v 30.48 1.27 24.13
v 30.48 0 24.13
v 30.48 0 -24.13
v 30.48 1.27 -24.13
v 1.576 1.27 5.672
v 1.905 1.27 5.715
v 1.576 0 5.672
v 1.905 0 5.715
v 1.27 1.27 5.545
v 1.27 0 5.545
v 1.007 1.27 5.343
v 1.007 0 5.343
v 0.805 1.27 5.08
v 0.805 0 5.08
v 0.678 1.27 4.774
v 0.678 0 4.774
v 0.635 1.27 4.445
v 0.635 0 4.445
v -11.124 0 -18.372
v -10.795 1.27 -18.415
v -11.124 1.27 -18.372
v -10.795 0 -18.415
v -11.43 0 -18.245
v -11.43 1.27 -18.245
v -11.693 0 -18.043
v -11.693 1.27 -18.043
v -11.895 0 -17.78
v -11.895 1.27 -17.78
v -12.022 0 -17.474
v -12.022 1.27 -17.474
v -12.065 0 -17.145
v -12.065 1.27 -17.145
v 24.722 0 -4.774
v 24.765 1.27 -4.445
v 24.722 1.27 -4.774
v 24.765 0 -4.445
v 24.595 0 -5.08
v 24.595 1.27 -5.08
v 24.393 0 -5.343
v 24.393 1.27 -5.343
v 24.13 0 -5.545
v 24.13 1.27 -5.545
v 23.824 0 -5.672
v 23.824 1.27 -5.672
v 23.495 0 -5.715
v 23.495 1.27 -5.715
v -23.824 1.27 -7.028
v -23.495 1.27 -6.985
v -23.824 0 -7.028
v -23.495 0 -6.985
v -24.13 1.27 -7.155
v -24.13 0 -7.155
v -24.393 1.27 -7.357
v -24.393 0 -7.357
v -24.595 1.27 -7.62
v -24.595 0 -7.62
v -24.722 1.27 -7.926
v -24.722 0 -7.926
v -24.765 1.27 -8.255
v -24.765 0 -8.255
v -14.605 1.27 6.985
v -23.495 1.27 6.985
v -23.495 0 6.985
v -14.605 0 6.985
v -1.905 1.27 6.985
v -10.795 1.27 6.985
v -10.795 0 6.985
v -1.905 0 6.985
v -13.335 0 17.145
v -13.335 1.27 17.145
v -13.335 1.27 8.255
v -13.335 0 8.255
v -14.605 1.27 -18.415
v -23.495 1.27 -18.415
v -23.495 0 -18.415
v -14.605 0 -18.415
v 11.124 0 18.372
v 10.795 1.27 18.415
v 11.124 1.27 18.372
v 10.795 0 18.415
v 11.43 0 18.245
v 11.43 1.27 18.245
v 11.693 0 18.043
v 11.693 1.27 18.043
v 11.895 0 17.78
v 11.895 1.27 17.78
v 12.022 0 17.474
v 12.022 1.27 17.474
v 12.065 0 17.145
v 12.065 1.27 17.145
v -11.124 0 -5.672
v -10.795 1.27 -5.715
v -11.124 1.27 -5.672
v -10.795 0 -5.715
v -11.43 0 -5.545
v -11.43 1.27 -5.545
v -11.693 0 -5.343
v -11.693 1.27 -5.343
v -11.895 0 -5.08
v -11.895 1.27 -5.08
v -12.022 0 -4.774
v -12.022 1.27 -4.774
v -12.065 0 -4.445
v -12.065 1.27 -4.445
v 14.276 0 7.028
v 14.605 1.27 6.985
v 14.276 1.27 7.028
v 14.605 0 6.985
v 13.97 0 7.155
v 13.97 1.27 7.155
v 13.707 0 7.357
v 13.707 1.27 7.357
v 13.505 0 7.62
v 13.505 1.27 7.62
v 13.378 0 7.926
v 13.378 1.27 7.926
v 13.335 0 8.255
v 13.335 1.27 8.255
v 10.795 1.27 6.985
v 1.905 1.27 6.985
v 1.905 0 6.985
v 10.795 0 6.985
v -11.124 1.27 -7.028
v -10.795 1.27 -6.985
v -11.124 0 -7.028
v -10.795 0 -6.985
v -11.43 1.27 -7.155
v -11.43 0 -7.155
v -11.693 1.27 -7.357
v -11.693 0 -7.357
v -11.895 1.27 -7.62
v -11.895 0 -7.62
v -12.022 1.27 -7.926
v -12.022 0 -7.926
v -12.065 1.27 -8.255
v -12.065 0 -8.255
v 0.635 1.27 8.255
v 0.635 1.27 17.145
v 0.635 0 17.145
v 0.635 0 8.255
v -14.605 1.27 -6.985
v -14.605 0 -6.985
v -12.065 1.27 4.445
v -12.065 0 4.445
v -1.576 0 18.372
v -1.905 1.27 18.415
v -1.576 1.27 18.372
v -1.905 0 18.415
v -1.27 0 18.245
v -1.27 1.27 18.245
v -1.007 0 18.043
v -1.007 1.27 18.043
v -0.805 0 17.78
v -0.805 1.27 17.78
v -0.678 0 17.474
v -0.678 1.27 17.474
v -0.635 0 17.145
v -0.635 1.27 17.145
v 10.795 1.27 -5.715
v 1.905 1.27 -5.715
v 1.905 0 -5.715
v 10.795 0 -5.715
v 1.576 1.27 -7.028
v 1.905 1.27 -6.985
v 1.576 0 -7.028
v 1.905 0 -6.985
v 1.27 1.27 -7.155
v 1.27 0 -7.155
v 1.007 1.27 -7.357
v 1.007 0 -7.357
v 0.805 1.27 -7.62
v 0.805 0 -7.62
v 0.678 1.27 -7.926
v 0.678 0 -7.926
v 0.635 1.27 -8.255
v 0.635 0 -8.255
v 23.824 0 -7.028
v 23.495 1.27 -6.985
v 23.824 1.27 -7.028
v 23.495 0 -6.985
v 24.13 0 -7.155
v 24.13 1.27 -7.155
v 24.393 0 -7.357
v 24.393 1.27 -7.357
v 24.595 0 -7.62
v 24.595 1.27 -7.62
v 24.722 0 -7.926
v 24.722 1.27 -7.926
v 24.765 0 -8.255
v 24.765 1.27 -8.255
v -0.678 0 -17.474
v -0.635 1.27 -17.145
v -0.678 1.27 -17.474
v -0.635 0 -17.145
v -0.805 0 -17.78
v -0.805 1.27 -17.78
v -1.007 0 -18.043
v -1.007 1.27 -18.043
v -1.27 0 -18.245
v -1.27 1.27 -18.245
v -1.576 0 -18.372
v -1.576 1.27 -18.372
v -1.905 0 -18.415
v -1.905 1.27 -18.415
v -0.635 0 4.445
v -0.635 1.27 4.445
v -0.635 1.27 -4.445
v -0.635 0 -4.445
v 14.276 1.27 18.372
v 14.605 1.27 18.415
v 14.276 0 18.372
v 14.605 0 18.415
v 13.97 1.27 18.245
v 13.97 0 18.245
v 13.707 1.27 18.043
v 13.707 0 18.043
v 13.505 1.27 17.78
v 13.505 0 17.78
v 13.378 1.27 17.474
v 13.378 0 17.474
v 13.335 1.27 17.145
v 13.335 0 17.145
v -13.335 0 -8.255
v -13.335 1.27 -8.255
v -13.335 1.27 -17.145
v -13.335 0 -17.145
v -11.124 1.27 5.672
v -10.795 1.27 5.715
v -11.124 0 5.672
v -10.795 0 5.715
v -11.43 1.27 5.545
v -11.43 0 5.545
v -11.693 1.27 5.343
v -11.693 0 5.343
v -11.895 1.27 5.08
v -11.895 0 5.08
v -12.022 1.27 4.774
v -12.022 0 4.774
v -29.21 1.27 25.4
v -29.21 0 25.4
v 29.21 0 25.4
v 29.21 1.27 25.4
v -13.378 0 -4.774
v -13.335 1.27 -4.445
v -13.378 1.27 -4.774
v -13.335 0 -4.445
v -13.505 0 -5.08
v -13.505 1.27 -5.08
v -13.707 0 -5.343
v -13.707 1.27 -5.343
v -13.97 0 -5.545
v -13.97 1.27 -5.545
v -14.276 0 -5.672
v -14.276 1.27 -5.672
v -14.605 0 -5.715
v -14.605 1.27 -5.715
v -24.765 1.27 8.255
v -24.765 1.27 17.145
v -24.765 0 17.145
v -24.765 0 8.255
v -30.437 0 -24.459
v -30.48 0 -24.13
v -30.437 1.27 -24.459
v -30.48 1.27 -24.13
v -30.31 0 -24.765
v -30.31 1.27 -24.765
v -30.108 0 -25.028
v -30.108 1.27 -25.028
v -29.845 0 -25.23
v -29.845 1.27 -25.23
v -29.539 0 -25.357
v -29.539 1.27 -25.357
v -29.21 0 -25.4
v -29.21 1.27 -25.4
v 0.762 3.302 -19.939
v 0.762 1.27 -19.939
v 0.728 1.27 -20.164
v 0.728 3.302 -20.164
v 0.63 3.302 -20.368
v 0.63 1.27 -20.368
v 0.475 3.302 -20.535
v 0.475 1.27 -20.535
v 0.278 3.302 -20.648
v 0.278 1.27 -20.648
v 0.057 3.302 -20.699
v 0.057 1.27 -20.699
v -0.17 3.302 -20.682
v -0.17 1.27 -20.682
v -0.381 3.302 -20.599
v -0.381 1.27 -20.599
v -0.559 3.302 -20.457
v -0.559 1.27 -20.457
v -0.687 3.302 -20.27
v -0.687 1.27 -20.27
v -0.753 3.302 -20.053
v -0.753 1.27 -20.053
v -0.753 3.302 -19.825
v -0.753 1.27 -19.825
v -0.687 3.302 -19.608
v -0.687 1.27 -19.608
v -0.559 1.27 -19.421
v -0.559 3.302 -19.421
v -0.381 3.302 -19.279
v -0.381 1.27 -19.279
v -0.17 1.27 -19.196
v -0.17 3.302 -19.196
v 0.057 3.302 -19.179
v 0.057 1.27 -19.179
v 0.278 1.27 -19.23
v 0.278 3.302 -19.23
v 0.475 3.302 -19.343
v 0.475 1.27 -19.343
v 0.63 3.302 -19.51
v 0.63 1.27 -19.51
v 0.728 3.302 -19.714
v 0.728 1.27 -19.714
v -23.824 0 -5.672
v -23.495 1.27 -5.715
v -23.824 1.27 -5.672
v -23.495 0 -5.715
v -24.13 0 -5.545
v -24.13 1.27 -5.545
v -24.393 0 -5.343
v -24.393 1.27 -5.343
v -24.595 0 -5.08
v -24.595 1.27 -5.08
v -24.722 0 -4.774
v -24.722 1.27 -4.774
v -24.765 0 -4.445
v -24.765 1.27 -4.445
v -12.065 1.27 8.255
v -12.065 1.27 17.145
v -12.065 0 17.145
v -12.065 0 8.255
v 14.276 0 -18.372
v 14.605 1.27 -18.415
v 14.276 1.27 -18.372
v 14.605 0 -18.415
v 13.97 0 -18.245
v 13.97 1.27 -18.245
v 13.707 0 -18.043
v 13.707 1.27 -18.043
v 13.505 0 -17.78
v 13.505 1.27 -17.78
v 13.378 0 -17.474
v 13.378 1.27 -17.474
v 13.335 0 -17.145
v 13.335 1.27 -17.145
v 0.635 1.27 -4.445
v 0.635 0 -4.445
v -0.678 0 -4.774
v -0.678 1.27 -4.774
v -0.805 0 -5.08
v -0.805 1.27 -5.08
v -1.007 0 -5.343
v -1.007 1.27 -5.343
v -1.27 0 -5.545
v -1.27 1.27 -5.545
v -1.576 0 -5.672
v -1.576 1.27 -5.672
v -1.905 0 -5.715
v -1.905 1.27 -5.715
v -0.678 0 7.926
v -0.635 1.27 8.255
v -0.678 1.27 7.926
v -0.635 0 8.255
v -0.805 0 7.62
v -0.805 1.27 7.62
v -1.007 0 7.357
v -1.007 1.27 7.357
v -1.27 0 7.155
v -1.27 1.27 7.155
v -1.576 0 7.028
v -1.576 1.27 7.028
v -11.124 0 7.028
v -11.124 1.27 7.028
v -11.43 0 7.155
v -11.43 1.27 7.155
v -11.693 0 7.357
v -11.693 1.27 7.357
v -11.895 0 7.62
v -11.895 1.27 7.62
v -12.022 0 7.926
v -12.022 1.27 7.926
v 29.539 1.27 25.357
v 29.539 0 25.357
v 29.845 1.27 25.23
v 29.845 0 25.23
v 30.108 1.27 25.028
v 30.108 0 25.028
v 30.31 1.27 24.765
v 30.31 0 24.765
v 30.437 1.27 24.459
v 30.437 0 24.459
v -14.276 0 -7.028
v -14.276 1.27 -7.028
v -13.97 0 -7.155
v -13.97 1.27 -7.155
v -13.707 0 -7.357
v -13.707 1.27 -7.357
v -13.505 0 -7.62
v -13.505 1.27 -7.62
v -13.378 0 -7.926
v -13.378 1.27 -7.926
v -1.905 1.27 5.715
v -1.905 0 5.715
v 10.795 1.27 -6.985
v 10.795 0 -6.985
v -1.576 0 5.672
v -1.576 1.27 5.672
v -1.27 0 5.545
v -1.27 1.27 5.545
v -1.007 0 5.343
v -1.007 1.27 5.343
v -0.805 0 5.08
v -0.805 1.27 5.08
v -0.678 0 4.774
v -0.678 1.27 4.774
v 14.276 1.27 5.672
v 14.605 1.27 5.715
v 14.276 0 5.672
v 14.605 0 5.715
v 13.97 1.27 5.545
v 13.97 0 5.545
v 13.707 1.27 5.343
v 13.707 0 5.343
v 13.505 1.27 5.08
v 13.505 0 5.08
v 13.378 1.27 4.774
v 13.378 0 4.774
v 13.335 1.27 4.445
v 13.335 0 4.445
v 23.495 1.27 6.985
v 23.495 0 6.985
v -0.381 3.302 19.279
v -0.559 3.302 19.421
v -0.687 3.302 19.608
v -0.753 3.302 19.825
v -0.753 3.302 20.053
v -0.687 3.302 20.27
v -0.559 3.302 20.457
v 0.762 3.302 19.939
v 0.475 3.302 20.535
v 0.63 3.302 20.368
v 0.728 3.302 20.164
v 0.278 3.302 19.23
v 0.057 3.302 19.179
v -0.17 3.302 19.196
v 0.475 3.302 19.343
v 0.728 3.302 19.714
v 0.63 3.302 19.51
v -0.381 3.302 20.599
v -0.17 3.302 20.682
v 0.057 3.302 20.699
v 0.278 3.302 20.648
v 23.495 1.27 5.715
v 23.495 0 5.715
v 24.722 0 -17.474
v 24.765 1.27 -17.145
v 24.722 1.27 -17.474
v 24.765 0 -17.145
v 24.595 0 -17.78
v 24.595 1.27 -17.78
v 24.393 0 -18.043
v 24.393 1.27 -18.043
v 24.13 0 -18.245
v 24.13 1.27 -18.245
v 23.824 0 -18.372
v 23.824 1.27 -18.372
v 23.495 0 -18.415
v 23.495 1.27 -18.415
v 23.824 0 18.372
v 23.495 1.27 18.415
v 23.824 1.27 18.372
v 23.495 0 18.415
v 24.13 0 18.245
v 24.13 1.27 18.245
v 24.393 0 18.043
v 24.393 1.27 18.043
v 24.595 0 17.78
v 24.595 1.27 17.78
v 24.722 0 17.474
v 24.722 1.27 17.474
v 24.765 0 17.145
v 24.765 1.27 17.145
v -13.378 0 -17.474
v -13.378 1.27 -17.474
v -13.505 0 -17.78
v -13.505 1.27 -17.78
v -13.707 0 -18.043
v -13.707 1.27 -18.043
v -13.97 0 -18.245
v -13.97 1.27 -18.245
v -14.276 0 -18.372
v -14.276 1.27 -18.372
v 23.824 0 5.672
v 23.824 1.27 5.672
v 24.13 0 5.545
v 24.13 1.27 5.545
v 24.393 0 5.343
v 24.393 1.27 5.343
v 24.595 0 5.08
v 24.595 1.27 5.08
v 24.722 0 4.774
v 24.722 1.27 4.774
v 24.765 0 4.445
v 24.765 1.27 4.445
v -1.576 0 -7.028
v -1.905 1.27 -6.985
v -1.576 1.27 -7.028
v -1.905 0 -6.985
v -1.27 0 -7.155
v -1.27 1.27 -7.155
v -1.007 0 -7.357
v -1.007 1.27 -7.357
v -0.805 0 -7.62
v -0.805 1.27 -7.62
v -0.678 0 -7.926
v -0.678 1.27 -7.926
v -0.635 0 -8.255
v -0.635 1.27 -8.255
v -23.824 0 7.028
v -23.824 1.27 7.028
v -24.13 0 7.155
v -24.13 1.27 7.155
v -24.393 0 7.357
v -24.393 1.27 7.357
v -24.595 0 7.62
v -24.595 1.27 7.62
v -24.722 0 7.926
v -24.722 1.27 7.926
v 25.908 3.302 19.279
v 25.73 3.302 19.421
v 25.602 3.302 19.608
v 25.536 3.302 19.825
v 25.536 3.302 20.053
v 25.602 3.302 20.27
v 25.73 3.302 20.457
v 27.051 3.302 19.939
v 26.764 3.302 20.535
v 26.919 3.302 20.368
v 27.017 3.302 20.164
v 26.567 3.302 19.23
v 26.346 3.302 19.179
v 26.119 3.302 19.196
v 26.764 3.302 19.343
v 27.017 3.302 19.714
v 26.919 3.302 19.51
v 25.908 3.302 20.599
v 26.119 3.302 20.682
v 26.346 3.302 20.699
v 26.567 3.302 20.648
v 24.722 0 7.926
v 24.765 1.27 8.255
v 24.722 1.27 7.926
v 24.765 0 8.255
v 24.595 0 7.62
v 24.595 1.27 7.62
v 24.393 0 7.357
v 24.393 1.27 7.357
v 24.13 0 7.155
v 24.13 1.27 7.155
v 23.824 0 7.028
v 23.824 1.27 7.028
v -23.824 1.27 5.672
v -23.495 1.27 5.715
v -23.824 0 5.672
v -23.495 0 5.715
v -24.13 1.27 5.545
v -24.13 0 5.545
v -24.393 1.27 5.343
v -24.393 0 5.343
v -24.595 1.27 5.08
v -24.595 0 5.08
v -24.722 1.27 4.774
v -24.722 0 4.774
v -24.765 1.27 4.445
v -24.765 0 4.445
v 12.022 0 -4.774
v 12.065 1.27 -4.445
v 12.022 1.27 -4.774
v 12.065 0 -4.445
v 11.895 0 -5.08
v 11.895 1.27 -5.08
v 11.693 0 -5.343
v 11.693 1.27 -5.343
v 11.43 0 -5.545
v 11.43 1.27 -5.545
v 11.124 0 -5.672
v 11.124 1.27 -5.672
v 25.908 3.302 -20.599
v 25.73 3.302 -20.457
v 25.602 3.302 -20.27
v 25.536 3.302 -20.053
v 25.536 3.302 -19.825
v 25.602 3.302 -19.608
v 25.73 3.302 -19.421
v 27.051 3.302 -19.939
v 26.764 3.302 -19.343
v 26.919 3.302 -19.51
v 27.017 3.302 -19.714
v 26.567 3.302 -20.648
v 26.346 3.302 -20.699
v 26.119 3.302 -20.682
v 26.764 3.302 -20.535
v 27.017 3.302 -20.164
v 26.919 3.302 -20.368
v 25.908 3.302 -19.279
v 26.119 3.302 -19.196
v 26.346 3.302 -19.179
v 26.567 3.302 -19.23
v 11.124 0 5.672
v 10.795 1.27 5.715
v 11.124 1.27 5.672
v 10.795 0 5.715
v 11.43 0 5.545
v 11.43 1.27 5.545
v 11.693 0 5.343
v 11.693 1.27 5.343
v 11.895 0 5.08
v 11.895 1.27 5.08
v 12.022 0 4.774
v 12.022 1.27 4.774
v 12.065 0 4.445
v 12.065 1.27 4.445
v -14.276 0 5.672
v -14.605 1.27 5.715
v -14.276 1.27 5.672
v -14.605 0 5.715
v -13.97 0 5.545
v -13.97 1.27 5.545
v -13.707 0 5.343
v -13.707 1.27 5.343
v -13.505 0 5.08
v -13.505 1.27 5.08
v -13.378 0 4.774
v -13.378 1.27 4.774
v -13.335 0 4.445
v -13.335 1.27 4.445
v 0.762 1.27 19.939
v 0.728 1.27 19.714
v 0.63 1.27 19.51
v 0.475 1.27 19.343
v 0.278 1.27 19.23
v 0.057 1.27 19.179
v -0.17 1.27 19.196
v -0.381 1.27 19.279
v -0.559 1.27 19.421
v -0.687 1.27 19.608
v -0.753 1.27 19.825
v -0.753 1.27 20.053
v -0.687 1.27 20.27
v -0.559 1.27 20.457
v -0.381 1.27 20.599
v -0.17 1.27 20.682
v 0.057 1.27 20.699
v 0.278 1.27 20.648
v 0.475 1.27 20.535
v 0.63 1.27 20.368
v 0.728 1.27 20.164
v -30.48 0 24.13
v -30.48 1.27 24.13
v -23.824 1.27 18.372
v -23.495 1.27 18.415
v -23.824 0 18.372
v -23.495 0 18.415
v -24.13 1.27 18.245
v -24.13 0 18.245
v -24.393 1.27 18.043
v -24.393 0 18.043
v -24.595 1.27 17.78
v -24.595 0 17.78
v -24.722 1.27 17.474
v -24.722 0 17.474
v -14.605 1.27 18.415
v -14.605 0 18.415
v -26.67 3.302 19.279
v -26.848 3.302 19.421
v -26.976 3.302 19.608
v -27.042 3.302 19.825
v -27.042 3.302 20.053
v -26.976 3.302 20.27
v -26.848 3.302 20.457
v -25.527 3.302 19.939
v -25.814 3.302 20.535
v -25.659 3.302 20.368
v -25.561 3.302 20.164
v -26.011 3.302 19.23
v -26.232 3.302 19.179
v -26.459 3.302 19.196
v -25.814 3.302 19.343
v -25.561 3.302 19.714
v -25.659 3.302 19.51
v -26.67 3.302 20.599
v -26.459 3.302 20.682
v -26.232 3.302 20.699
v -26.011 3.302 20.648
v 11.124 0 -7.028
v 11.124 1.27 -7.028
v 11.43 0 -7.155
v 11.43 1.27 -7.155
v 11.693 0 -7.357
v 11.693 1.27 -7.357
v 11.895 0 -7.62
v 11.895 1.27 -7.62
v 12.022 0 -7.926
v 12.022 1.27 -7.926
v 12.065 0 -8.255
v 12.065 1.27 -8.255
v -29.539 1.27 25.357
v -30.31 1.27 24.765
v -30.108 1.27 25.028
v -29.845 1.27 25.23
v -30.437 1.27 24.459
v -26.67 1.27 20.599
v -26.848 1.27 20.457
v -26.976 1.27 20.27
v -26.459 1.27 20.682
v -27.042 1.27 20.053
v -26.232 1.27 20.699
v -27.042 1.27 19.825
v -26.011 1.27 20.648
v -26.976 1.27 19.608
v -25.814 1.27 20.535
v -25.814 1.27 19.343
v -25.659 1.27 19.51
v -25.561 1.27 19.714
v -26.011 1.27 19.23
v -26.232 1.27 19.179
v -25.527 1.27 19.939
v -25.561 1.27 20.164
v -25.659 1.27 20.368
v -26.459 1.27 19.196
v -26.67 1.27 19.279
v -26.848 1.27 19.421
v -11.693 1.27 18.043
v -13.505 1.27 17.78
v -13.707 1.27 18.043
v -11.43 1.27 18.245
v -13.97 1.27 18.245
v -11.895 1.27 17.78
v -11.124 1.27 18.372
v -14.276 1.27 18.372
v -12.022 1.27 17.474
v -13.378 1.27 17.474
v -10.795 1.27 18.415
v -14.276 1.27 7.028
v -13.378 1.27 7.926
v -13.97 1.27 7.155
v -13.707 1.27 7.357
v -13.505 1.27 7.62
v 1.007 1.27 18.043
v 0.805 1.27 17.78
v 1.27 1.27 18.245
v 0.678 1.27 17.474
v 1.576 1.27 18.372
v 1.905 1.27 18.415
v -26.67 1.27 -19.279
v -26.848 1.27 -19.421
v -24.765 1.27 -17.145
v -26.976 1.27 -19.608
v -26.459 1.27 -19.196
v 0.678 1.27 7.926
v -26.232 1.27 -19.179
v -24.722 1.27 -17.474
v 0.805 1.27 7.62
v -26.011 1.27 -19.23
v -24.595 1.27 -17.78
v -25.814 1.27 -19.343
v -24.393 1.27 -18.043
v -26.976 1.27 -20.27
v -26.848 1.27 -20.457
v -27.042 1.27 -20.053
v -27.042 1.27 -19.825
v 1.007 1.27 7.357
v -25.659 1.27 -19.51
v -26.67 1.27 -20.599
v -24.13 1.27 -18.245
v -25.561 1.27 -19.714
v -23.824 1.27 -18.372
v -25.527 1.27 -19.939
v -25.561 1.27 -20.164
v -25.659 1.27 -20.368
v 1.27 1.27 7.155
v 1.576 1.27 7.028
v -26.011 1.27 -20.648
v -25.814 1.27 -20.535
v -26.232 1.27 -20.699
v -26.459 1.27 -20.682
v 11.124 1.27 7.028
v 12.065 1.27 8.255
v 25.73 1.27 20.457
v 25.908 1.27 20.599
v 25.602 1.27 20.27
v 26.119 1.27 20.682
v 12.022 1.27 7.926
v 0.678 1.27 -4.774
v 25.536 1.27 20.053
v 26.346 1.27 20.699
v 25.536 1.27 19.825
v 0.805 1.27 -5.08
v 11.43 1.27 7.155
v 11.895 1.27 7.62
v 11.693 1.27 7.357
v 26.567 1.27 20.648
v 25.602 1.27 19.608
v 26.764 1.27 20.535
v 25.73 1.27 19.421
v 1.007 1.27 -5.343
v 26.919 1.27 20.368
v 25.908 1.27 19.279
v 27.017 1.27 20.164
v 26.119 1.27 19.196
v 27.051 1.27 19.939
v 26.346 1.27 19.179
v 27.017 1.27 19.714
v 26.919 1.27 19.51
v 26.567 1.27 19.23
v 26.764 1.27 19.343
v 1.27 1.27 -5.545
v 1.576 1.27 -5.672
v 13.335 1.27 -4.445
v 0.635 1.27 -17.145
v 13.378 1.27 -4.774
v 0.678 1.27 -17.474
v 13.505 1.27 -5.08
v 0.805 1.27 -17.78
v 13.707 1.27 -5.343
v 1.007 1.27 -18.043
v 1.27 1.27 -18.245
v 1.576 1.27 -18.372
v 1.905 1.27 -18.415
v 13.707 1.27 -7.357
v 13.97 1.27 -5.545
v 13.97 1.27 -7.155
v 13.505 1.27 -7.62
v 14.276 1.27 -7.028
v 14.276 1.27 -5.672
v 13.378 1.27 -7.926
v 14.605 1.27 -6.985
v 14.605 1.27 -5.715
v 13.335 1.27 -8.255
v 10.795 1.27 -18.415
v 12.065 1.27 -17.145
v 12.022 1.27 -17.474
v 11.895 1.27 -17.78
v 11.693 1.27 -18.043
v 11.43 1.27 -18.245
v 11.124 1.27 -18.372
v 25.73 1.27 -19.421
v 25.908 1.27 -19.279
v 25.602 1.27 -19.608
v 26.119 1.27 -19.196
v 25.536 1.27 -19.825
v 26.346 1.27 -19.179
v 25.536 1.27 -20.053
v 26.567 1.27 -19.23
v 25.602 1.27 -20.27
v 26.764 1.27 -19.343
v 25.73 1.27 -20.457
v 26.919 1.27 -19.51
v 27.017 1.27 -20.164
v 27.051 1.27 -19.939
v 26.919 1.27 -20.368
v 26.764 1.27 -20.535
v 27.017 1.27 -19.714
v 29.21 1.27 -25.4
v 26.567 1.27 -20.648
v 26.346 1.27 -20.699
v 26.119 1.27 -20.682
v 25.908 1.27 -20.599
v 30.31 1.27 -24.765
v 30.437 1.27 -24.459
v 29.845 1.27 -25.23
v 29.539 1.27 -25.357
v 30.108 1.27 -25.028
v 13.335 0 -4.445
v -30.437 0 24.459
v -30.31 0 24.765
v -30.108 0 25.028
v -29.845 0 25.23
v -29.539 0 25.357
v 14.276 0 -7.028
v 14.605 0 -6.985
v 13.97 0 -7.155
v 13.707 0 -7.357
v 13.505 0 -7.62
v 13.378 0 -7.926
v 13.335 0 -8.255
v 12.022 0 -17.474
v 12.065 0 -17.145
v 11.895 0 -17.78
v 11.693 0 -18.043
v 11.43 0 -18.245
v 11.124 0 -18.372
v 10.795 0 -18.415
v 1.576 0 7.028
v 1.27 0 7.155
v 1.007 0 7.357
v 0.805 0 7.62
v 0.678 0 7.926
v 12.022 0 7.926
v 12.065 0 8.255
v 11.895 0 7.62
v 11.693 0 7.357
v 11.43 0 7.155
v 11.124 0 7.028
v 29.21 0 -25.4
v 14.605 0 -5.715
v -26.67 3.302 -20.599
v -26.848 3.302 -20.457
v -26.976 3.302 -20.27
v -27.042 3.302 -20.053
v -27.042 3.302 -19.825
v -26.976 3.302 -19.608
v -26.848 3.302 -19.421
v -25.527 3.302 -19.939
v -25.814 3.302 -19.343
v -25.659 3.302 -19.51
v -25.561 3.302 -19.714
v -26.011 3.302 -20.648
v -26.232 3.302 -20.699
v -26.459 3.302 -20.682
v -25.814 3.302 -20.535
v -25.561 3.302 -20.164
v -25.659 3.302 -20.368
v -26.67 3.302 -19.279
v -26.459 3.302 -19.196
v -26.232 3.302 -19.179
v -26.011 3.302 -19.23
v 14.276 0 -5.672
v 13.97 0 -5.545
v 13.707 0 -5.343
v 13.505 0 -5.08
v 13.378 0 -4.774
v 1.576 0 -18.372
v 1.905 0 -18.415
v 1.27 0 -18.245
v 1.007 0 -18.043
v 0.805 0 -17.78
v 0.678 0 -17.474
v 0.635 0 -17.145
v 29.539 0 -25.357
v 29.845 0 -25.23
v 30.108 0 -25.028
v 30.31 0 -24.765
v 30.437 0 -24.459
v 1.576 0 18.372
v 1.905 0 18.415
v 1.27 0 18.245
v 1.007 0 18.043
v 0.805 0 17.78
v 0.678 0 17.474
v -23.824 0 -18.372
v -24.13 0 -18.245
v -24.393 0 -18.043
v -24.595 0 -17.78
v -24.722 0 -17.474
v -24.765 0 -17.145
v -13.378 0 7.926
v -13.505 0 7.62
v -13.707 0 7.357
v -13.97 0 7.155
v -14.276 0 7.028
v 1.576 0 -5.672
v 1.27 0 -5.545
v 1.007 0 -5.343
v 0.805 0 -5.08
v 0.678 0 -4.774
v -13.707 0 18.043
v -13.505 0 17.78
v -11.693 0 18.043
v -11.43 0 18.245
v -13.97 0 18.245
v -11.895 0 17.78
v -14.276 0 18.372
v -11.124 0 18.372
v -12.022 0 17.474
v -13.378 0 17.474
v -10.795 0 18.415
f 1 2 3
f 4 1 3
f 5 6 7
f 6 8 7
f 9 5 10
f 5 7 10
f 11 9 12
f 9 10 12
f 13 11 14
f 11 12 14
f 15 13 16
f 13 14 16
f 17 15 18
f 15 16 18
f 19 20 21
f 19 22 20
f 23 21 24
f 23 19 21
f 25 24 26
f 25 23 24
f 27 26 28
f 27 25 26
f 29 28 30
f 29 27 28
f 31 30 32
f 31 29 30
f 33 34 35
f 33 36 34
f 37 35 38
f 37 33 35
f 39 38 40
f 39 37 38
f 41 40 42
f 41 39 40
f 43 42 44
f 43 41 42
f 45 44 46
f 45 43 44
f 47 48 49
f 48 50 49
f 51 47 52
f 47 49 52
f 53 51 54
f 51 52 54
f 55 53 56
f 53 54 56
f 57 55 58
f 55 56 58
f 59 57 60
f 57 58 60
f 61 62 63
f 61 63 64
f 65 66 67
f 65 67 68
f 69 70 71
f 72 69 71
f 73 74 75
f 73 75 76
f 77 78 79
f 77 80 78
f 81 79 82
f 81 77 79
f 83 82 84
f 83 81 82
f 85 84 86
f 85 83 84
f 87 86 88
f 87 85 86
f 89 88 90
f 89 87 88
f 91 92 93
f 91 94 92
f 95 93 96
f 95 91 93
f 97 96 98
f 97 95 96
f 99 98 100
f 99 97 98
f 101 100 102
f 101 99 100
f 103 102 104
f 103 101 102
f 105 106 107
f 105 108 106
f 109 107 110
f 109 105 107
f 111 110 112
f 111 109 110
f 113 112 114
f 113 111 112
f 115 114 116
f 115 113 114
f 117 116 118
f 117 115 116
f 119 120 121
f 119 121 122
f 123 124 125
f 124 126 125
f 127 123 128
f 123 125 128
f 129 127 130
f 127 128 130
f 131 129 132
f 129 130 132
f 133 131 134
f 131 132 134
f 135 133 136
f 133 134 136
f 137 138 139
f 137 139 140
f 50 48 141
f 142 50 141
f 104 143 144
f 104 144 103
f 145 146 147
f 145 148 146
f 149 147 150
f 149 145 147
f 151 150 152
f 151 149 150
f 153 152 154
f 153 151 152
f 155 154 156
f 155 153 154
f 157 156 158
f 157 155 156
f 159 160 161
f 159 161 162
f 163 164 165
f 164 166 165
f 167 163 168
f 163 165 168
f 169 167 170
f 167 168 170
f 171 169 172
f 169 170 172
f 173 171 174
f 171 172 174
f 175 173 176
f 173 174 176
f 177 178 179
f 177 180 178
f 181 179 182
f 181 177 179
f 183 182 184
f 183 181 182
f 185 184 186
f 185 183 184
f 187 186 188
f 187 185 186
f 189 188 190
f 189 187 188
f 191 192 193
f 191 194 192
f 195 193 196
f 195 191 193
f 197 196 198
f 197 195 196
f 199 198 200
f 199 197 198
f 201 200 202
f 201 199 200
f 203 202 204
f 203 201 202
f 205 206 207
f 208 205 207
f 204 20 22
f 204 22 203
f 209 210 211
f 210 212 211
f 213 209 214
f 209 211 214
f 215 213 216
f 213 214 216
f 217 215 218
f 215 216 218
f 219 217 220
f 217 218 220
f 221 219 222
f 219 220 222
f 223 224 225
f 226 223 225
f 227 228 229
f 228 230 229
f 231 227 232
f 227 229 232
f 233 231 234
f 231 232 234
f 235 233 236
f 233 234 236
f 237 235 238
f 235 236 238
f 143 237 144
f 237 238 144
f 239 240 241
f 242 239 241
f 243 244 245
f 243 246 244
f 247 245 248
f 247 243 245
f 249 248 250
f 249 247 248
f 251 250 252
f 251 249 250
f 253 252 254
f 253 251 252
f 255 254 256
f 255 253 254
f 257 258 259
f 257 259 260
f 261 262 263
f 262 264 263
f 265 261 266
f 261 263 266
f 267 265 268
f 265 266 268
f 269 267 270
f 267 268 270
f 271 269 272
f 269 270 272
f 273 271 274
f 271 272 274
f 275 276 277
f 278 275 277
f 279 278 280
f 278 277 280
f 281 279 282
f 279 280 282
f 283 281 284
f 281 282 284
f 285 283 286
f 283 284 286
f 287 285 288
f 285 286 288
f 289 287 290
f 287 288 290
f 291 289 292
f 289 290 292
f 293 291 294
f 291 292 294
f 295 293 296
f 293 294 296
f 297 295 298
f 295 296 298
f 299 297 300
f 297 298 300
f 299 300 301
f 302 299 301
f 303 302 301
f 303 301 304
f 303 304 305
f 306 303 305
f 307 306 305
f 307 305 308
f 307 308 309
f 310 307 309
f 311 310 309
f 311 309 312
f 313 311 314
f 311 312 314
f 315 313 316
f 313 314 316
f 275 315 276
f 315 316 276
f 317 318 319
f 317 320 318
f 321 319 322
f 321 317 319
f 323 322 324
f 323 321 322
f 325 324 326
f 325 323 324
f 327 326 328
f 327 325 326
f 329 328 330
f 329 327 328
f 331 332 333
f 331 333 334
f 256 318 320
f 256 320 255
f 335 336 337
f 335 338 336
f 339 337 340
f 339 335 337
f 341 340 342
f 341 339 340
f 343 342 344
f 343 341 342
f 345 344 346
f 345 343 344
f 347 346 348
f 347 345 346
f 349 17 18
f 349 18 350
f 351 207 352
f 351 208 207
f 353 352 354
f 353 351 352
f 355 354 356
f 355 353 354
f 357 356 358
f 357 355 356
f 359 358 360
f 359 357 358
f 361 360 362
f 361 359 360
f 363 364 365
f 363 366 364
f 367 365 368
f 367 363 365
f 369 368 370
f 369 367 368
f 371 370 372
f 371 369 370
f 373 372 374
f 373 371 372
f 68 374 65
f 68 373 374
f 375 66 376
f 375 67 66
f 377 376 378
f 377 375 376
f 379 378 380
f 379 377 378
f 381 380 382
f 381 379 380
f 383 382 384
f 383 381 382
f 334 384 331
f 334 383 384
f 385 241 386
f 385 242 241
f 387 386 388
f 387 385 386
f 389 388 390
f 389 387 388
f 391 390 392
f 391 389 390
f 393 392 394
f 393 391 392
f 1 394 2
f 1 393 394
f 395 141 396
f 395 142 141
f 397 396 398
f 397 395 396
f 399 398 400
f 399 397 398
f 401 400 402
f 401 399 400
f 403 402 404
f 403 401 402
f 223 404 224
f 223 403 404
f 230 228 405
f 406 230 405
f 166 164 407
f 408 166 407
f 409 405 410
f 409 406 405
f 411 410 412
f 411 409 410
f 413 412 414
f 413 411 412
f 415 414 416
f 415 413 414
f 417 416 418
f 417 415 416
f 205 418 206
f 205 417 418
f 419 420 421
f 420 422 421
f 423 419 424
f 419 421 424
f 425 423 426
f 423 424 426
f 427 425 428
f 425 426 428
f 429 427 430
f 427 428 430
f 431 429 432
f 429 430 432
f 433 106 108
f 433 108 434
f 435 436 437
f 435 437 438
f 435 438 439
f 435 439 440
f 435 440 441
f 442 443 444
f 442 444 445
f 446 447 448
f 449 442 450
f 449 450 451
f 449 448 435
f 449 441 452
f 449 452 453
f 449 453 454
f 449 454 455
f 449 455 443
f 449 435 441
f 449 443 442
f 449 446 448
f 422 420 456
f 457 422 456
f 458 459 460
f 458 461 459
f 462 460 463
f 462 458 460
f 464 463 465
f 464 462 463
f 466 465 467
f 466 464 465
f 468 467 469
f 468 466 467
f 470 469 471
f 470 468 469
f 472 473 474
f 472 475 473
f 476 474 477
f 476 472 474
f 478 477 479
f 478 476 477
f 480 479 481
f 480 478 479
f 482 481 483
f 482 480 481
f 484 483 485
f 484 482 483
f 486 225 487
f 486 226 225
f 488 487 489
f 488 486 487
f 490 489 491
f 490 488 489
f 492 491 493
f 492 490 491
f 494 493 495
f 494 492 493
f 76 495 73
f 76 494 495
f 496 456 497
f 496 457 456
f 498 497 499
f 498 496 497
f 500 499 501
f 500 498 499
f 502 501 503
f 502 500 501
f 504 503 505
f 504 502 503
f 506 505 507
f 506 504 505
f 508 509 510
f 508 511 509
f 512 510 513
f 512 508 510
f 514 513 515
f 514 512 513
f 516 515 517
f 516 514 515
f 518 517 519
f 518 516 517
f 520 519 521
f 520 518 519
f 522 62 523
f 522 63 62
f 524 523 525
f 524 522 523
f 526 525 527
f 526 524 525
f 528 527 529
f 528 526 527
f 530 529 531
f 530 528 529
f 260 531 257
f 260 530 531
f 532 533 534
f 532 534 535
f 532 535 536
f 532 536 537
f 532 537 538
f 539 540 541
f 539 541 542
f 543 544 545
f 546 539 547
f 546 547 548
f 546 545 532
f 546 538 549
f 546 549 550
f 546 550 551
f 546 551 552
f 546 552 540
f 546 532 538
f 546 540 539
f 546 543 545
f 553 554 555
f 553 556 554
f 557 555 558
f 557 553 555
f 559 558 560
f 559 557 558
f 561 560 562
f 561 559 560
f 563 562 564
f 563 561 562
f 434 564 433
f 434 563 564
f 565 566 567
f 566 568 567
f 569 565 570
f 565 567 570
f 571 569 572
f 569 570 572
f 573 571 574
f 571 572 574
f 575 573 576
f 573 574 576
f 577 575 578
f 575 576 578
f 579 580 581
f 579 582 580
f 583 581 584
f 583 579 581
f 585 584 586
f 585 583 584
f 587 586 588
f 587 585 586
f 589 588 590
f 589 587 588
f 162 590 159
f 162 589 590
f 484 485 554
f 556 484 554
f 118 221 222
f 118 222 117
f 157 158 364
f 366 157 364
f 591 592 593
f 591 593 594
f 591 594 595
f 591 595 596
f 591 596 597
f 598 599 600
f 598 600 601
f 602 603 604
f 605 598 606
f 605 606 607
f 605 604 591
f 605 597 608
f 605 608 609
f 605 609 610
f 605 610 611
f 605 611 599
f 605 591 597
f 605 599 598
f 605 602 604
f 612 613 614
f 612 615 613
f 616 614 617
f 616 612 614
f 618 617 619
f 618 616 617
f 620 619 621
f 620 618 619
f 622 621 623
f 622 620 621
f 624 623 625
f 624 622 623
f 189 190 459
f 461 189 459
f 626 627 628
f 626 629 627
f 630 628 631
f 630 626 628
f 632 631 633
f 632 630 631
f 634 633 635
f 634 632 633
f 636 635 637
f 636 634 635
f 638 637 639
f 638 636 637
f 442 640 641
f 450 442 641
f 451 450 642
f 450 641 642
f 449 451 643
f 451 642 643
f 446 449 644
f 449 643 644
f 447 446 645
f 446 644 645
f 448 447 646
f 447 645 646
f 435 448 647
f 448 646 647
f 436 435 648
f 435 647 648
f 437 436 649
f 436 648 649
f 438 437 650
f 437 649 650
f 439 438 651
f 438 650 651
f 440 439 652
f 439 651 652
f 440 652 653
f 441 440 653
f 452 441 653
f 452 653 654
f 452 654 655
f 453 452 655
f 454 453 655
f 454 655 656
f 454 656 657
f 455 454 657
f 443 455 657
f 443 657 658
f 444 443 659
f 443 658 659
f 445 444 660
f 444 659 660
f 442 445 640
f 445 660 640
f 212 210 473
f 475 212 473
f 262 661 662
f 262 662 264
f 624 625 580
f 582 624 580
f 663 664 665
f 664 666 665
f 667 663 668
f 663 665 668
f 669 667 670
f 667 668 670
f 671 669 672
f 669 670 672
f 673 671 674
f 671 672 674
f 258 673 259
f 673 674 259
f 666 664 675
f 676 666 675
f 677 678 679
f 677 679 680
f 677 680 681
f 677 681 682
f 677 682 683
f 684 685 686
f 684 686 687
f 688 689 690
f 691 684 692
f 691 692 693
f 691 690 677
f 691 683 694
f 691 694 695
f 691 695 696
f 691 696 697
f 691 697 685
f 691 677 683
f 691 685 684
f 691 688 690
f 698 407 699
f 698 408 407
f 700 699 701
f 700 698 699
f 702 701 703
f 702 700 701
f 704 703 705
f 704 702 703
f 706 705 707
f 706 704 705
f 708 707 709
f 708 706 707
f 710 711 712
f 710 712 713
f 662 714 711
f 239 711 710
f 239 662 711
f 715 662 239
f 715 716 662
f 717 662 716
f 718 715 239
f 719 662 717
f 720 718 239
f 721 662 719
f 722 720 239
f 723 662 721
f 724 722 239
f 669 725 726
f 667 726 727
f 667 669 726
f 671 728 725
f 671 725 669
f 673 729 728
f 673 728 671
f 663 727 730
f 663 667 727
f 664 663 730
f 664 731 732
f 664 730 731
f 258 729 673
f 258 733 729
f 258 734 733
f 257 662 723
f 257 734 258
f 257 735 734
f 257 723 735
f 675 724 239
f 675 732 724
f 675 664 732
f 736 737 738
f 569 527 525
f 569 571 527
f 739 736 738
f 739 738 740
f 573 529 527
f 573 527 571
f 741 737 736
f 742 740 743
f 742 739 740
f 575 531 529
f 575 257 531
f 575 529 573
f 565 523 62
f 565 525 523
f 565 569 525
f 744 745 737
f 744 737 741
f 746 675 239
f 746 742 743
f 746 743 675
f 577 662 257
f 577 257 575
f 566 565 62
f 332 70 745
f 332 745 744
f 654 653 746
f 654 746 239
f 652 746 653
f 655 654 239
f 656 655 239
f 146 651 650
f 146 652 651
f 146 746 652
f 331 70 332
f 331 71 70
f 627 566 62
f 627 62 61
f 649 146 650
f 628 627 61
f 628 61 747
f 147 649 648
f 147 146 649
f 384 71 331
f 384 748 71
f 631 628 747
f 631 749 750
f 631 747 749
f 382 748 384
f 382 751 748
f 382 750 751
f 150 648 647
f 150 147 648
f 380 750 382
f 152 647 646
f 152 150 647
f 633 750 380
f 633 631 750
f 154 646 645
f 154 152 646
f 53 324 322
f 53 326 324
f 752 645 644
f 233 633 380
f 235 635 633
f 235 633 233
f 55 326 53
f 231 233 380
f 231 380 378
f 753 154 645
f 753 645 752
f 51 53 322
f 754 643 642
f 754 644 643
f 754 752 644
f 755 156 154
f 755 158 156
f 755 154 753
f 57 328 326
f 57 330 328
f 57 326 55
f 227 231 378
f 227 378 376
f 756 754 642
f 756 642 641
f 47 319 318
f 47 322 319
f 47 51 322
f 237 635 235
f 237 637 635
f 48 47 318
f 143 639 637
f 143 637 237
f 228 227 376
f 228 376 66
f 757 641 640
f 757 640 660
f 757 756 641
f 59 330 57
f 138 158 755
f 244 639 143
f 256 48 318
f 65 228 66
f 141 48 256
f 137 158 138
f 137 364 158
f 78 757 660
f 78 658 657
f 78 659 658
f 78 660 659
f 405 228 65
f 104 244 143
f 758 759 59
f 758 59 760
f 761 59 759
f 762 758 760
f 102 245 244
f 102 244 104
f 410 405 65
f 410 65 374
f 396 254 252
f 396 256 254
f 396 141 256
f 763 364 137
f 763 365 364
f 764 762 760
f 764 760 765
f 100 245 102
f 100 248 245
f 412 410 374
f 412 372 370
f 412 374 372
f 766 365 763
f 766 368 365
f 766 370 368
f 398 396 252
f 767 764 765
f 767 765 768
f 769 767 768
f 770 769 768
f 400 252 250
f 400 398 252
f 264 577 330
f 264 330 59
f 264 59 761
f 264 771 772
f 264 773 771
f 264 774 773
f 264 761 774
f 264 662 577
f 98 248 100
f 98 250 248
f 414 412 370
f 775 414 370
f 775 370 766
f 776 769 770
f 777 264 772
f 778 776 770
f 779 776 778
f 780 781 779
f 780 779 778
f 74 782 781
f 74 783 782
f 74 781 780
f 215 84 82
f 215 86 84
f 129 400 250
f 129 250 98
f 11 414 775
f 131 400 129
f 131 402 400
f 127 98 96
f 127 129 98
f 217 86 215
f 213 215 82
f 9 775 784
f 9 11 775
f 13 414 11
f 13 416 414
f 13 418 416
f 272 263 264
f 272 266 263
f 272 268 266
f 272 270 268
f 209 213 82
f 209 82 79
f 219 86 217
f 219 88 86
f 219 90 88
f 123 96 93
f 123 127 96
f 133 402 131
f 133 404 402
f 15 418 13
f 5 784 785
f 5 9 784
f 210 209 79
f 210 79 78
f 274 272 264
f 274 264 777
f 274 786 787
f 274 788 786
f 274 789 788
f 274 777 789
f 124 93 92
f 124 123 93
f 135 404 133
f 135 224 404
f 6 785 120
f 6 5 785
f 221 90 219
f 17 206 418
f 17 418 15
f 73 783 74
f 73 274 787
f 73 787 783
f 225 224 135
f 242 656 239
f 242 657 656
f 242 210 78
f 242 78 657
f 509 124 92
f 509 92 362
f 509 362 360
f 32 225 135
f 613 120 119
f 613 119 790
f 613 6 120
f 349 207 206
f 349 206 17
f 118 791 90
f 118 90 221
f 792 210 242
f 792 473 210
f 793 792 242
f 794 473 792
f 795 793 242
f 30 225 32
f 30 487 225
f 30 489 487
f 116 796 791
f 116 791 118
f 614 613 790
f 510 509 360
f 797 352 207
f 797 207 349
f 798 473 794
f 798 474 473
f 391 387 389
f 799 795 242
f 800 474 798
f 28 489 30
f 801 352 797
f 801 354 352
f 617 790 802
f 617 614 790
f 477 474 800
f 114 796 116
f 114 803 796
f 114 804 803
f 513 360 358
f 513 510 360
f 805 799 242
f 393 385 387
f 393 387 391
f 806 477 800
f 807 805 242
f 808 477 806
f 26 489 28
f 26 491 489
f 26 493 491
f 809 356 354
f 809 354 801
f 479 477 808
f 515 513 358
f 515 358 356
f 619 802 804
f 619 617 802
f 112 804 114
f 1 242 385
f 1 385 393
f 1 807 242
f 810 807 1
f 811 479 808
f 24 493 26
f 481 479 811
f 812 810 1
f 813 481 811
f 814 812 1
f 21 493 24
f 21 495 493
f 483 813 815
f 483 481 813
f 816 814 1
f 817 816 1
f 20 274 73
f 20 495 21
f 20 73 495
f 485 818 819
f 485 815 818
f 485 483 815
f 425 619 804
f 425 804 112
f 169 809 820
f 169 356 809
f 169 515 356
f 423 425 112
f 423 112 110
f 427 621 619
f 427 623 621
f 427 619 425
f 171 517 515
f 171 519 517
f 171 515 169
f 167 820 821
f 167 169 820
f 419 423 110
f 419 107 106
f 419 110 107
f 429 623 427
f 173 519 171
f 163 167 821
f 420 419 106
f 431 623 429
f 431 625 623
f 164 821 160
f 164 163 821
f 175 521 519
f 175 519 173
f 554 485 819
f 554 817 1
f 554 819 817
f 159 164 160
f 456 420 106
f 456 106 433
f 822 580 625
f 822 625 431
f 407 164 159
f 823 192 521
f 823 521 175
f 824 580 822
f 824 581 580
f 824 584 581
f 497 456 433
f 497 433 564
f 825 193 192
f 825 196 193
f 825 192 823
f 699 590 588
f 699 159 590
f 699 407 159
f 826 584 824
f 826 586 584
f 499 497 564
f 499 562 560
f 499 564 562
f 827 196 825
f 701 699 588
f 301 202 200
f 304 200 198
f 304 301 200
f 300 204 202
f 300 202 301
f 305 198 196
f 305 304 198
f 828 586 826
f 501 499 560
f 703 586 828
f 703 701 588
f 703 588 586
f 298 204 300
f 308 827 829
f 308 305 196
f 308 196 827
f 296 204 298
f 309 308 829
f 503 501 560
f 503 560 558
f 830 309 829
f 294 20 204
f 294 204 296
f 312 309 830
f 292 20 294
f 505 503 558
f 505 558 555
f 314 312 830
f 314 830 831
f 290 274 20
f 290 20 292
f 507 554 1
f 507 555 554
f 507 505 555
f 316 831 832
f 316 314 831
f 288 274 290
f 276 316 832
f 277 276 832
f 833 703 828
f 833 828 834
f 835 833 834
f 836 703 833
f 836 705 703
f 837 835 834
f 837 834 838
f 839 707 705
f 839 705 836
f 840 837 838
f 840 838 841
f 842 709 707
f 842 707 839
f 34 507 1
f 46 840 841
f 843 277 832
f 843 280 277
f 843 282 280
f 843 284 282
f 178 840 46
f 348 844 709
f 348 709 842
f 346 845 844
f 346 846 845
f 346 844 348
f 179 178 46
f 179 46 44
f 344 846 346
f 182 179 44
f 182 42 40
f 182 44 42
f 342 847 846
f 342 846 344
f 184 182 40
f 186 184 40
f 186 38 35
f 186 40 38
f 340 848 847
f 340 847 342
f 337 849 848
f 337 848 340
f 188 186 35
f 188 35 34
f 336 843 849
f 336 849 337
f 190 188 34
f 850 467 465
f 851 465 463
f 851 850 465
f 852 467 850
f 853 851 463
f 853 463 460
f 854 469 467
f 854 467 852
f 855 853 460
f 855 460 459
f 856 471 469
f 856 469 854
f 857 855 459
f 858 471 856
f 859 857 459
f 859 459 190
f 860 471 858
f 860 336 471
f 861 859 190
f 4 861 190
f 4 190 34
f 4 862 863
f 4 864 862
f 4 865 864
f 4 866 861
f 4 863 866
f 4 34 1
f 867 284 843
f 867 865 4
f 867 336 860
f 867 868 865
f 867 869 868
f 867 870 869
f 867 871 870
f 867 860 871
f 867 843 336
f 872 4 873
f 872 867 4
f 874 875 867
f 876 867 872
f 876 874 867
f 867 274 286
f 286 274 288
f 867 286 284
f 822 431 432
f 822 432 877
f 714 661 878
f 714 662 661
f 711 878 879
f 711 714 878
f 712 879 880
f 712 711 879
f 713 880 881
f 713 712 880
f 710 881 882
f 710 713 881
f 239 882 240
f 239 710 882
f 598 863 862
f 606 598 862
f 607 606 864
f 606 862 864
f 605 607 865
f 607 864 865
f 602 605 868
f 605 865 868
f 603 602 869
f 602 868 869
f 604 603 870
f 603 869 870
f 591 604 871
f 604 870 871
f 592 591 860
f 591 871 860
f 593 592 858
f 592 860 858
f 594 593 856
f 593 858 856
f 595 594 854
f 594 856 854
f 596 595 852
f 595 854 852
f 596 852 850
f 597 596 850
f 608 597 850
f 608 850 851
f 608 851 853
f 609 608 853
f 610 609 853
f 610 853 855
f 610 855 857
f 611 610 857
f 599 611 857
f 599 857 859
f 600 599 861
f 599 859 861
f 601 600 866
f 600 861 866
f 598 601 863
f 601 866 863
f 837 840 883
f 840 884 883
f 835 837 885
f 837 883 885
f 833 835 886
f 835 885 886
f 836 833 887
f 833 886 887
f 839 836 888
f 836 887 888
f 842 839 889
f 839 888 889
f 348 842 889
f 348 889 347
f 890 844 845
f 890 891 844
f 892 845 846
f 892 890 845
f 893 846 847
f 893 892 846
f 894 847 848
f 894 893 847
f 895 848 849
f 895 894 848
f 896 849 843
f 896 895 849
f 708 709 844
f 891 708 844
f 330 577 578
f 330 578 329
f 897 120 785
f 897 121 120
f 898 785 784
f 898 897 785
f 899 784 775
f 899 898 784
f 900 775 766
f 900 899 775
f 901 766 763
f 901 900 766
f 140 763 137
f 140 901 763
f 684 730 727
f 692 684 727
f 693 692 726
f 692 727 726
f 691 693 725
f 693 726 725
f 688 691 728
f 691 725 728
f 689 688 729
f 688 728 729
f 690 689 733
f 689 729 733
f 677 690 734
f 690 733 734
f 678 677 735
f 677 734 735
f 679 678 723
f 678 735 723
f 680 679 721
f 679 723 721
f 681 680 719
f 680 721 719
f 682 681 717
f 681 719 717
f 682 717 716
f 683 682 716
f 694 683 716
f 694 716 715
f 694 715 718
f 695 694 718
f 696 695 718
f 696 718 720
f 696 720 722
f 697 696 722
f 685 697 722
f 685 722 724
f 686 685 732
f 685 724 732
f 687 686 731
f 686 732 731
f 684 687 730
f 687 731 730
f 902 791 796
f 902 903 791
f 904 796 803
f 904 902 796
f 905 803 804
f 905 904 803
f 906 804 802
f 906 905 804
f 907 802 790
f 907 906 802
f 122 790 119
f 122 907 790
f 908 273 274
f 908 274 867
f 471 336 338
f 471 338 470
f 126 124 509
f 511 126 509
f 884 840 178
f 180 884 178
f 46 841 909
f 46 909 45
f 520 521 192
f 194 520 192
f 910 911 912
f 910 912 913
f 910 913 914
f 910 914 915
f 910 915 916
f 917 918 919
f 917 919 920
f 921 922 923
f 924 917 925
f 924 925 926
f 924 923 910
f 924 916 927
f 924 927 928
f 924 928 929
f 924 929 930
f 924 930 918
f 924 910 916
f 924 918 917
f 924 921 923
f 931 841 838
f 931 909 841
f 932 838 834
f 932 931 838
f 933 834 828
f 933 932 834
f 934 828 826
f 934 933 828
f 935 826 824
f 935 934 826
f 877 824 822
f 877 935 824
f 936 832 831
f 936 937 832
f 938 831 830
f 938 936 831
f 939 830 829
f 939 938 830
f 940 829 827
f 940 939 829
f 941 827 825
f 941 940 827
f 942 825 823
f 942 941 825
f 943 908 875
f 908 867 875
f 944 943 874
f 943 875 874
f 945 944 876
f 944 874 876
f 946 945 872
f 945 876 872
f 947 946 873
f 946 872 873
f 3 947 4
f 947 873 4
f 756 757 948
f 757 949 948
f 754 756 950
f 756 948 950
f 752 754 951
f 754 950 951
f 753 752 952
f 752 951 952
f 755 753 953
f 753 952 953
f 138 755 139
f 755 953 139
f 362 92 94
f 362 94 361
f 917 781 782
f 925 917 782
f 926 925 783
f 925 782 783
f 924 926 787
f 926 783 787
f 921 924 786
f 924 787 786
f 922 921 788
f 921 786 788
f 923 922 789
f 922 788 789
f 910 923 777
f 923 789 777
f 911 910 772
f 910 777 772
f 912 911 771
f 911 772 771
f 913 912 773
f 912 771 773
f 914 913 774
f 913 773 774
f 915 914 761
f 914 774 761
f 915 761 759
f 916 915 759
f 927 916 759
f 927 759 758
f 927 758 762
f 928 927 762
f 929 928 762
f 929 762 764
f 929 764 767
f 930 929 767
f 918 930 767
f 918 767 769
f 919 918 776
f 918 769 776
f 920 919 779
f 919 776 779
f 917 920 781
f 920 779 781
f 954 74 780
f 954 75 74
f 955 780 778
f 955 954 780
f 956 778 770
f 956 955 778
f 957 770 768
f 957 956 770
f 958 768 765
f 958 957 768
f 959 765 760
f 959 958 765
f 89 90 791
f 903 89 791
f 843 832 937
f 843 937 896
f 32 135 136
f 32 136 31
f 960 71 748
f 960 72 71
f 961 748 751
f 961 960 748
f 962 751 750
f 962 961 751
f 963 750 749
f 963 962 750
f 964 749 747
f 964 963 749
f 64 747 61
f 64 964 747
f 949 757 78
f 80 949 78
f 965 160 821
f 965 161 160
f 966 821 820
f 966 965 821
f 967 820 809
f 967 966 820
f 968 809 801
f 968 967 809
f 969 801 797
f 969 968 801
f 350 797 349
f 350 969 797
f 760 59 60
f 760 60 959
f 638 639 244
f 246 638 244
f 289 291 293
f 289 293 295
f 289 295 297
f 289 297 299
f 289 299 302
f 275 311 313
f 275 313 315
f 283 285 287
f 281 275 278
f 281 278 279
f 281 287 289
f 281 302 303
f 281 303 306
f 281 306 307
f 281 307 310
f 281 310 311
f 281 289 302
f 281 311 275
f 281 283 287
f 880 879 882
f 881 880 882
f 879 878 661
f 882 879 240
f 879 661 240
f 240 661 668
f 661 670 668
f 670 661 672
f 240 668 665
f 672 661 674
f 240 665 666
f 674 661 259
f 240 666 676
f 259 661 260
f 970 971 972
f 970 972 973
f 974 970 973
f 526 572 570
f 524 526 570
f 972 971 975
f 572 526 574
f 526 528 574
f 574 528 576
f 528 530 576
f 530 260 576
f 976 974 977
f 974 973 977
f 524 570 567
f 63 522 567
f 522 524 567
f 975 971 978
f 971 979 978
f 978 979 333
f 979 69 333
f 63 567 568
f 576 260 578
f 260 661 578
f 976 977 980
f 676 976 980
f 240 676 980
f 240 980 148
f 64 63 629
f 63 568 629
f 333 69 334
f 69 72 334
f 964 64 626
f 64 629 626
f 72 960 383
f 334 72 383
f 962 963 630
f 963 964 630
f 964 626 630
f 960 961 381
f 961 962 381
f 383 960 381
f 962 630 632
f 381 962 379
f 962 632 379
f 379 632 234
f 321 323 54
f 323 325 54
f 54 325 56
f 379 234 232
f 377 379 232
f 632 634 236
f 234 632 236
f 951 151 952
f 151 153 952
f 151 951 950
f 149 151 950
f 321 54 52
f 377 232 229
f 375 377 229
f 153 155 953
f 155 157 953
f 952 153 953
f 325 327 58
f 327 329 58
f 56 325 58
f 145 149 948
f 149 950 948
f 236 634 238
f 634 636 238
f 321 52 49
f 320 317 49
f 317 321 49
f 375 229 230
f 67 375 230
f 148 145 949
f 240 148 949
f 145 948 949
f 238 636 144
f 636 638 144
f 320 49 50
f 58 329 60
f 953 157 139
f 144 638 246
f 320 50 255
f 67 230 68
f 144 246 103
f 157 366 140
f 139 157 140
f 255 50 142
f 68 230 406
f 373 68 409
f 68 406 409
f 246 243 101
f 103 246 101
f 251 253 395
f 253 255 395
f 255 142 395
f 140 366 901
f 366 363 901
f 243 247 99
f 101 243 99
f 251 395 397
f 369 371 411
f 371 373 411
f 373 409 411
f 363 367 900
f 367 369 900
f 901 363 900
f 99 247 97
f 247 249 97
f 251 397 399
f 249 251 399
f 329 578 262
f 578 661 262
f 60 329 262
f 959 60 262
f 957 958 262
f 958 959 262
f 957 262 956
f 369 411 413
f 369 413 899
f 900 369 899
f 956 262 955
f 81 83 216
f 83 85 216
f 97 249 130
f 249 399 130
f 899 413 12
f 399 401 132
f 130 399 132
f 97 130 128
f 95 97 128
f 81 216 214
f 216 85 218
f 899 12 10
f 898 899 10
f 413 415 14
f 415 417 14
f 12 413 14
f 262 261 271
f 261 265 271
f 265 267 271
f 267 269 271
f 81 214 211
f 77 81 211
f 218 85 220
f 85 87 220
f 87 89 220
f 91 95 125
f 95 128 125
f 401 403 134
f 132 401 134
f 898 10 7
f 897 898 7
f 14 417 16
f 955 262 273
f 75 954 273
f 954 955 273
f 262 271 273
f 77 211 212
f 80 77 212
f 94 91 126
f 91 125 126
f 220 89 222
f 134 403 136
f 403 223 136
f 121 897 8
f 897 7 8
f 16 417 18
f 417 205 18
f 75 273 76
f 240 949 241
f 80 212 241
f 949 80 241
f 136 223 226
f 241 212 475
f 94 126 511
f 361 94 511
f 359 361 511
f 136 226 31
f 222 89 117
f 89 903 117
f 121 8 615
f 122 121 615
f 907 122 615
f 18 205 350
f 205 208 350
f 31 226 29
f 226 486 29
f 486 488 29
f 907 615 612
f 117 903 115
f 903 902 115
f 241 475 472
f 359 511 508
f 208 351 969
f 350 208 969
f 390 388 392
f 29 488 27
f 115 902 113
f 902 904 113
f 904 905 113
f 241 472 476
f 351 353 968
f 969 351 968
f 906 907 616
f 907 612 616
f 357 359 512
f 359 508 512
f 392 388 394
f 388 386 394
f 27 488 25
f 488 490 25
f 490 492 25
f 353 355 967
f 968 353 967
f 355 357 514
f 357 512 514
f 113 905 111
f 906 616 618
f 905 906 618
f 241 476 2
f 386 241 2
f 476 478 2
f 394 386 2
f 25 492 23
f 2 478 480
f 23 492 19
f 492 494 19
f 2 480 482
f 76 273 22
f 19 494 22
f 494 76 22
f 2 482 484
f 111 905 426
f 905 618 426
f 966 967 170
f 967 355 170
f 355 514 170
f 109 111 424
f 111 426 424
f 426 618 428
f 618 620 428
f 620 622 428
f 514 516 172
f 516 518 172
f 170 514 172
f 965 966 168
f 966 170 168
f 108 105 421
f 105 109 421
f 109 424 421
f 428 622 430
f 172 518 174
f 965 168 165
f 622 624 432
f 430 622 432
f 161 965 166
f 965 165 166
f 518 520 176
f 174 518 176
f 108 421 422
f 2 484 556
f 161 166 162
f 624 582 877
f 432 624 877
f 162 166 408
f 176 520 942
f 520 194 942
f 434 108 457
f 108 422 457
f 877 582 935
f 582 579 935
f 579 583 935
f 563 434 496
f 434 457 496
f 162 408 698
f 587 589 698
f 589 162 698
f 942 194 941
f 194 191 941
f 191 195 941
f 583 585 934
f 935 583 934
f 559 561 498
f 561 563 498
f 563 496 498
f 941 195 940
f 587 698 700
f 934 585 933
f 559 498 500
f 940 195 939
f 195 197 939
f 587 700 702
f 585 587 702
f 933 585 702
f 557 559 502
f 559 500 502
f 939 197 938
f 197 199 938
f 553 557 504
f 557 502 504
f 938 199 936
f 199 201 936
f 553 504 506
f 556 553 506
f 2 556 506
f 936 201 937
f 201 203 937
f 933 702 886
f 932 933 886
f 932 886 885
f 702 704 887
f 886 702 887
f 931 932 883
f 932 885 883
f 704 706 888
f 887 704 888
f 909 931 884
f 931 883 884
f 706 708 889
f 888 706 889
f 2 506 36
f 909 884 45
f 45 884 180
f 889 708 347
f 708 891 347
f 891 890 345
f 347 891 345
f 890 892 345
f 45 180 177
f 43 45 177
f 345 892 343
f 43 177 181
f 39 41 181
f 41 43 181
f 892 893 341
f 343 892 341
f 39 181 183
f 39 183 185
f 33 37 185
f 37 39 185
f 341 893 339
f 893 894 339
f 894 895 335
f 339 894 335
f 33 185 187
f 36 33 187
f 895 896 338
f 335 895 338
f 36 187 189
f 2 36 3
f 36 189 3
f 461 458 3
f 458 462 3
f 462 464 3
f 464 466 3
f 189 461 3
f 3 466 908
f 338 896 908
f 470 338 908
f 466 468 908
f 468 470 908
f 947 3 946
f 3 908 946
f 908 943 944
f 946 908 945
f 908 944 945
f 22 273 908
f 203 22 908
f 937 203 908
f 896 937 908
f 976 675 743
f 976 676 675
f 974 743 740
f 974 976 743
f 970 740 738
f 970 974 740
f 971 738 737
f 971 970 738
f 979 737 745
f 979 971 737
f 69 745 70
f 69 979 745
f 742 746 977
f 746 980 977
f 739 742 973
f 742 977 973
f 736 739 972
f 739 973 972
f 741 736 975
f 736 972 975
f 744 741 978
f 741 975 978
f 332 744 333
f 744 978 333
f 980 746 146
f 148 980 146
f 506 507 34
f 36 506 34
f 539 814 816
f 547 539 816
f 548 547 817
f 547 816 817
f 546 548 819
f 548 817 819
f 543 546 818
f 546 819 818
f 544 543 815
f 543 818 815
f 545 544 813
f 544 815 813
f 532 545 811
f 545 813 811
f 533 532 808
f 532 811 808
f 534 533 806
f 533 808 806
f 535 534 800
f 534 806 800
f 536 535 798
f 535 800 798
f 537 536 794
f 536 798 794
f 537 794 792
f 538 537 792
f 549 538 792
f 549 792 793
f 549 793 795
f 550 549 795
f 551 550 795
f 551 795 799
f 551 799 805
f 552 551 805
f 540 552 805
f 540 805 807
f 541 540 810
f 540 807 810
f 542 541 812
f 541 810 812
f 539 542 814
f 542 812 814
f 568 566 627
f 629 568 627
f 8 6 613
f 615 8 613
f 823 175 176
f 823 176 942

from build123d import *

# Parameters (mm, degrees)
SKETCH1_W               = 60.96
SKETCH1_H               = 50.8
BOSS_EXTRUDE1_DEPTH     = 1.27
SKETCH2_W               = 11.43
SKETCH2_H               = 11.43
CUT_EXTRUDE1_DEPTH      = 2.27
FILLET2_R               = 1.27
SKETCH4_R               = 0.762
BOSS_EXTRUDE2_DEPTH     = 2.032
FILLET3_R               = 1.27
LPATTERN13_COUNT        = 4
LPATTERN13_PITCH        = 12.7
LPATTERN13_COUNT_DIR2   = 3
LPATTERN13_PITCH_DIR2   = 12.7
FILLET2_OF_LPATTERN13_R = 1.27
LPATTERN14_COUNT        = 3
LPATTERN14_PITCH        = 26.289
LPATTERN14_COUNT_DIR2   = 3
LPATTERN14_PITCH_DIR2   = 39.878


with BuildPart() as part:
    # Sketch1 → Boss-Extrude1 (new body)
    with BuildSketch(Plane(origin=(0, 0, 0), x_dir=(1, 0, 0), z_dir=(0, 1, 0))):
        Rectangle(SKETCH1_W, SKETCH1_H)
    extrude(amount=BOSS_EXTRUDE1_DEPTH)

    # Sketch2 → Cut-Extrude1 (cut, through all)
    with BuildSketch(Plane(origin=(0, 1.27, 0), x_dir=(1, 0, 0), z_dir=(0, 1, 0))):
        with Locations((-19.05, 12.7)):
            Rectangle(SKETCH2_W, SKETCH2_H)
    cut_extrude1 = extrude(amount=-CUT_EXTRUDE1_DEPTH, mode=Mode.SUBTRACT)

    # Fillet2
    fillet2_edges = [part.edges().sort_by_distance(p)[0] for p in [
        (-13.335, 0.635, -18.415),
        (-13.335, 0.635, -6.985),
        (-24.765, 0.635, -6.985),
        (-24.765, 0.635, -18.415),
    ]]
    fillet(fillet2_edges, radius=FILLET2_R)

    # Sketch4 → Boss-Extrude2 (add)
    with BuildSketch(Plane(origin=(0, 1.27, 0), x_dir=(1, 0, 0), z_dir=(0, 1, 0))):
        with Locations((-26.289, 19.939)):
            Circle(SKETCH4_R)
    boss_extrude2 = extrude(amount=BOSS_EXTRUDE2_DEPTH)

    # Fillet3
    fillet3_edges = [part.edges().sort_by_distance(p)[0] for p in [
        (-30.48, 0.635, -25.4),
        (30.48, 0.635, -25.4),
        (30.48, 0.635, 25.4),
        (-30.48, 0.635, 25.4),
    ]]
    fillet(fillet3_edges, radius=FILLET3_R)

    # LPattern13: Cut-Extrude1 4 × 3
    with Locations(*[(i * LPATTERN13_PITCH, 0, j * LPATTERN13_PITCH_DIR2) for i in range(LPATTERN13_COUNT) for j in range(LPATTERN13_COUNT_DIR2) if (i, j) != (0, 0)]):
        add(cut_extrude1, mode=Mode.SUBTRACT)

    # Fillet2 of LPattern13
    fillet2_of_lpattern13_edges = [part.edges().sort_by_distance(p)[0] for p in [
        (-13.335, 0.635, -5.715),
        (-13.335, 0.635, 5.715),
        (-24.765, 0.635, 5.715),
        (-24.765, 0.635, -5.715),
        (-13.335, 0.635, 6.985),
        (-13.335, 0.635, 18.415),
        (-24.765, 0.635, 18.415),
        (-24.765, 0.635, 6.985),
        (-0.635, 0.635, -18.415),
        (-0.635, 0.635, -6.985),
        (-12.065, 0.635, -6.985),
        (-12.065, 0.635, -18.415),
        (-0.635, 0.635, -5.715),
        (-0.635, 0.635, 5.715),
        (-12.065, 0.635, 5.715),
        (-12.065, 0.635, -5.715),
        (-0.635, 0.635, 6.985),
        (-0.635, 0.635, 18.415),
        (-12.065, 0.635, 18.415),
        (-12.065, 0.635, 6.985),
        (12.065, 0.635, -18.415),
        (12.065, 0.635, -6.985),
        (0.635, 0.635, -6.985),
        (0.635, 0.635, -18.415),
        (12.065, 0.635, -5.715),
        (12.065, 0.635, 5.715),
        (0.635, 0.635, 5.715),
        (0.635, 0.635, -5.715),
        (12.065, 0.635, 6.985),
        (12.065, 0.635, 18.415),
        (0.635, 0.635, 18.415),
        (0.635, 0.635, 6.985),
        (24.765, 0.635, -18.415),
        (24.765, 0.635, -6.985),
        (13.335, 0.635, -6.985),
        (13.335, 0.635, -18.415),
        (24.765, 0.635, -5.715),
        (24.765, 0.635, 5.715),
        (13.335, 0.635, 5.715),
        (13.335, 0.635, -5.715),
        (24.765, 0.635, 6.985),
        (24.765, 0.635, 18.415),
        (13.335, 0.635, 18.415),
        (13.335, 0.635, 6.985),
    ]]
    fillet(fillet2_of_lpattern13_edges, radius=FILLET2_OF_LPATTERN13_R)

    # LPattern14: Boss-Extrude2 3 × 3, 3 skipped
    with Locations(*[(i * LPATTERN14_PITCH, 0, j * LPATTERN14_PITCH_DIR2) for i in range(LPATTERN14_COUNT) for j in range(LPATTERN14_COUNT_DIR2) if (i, j) not in ((0, 0), (0, 2), (1, 2), (2, 2))]):
        add(boss_extrude2)


solid = part.part
